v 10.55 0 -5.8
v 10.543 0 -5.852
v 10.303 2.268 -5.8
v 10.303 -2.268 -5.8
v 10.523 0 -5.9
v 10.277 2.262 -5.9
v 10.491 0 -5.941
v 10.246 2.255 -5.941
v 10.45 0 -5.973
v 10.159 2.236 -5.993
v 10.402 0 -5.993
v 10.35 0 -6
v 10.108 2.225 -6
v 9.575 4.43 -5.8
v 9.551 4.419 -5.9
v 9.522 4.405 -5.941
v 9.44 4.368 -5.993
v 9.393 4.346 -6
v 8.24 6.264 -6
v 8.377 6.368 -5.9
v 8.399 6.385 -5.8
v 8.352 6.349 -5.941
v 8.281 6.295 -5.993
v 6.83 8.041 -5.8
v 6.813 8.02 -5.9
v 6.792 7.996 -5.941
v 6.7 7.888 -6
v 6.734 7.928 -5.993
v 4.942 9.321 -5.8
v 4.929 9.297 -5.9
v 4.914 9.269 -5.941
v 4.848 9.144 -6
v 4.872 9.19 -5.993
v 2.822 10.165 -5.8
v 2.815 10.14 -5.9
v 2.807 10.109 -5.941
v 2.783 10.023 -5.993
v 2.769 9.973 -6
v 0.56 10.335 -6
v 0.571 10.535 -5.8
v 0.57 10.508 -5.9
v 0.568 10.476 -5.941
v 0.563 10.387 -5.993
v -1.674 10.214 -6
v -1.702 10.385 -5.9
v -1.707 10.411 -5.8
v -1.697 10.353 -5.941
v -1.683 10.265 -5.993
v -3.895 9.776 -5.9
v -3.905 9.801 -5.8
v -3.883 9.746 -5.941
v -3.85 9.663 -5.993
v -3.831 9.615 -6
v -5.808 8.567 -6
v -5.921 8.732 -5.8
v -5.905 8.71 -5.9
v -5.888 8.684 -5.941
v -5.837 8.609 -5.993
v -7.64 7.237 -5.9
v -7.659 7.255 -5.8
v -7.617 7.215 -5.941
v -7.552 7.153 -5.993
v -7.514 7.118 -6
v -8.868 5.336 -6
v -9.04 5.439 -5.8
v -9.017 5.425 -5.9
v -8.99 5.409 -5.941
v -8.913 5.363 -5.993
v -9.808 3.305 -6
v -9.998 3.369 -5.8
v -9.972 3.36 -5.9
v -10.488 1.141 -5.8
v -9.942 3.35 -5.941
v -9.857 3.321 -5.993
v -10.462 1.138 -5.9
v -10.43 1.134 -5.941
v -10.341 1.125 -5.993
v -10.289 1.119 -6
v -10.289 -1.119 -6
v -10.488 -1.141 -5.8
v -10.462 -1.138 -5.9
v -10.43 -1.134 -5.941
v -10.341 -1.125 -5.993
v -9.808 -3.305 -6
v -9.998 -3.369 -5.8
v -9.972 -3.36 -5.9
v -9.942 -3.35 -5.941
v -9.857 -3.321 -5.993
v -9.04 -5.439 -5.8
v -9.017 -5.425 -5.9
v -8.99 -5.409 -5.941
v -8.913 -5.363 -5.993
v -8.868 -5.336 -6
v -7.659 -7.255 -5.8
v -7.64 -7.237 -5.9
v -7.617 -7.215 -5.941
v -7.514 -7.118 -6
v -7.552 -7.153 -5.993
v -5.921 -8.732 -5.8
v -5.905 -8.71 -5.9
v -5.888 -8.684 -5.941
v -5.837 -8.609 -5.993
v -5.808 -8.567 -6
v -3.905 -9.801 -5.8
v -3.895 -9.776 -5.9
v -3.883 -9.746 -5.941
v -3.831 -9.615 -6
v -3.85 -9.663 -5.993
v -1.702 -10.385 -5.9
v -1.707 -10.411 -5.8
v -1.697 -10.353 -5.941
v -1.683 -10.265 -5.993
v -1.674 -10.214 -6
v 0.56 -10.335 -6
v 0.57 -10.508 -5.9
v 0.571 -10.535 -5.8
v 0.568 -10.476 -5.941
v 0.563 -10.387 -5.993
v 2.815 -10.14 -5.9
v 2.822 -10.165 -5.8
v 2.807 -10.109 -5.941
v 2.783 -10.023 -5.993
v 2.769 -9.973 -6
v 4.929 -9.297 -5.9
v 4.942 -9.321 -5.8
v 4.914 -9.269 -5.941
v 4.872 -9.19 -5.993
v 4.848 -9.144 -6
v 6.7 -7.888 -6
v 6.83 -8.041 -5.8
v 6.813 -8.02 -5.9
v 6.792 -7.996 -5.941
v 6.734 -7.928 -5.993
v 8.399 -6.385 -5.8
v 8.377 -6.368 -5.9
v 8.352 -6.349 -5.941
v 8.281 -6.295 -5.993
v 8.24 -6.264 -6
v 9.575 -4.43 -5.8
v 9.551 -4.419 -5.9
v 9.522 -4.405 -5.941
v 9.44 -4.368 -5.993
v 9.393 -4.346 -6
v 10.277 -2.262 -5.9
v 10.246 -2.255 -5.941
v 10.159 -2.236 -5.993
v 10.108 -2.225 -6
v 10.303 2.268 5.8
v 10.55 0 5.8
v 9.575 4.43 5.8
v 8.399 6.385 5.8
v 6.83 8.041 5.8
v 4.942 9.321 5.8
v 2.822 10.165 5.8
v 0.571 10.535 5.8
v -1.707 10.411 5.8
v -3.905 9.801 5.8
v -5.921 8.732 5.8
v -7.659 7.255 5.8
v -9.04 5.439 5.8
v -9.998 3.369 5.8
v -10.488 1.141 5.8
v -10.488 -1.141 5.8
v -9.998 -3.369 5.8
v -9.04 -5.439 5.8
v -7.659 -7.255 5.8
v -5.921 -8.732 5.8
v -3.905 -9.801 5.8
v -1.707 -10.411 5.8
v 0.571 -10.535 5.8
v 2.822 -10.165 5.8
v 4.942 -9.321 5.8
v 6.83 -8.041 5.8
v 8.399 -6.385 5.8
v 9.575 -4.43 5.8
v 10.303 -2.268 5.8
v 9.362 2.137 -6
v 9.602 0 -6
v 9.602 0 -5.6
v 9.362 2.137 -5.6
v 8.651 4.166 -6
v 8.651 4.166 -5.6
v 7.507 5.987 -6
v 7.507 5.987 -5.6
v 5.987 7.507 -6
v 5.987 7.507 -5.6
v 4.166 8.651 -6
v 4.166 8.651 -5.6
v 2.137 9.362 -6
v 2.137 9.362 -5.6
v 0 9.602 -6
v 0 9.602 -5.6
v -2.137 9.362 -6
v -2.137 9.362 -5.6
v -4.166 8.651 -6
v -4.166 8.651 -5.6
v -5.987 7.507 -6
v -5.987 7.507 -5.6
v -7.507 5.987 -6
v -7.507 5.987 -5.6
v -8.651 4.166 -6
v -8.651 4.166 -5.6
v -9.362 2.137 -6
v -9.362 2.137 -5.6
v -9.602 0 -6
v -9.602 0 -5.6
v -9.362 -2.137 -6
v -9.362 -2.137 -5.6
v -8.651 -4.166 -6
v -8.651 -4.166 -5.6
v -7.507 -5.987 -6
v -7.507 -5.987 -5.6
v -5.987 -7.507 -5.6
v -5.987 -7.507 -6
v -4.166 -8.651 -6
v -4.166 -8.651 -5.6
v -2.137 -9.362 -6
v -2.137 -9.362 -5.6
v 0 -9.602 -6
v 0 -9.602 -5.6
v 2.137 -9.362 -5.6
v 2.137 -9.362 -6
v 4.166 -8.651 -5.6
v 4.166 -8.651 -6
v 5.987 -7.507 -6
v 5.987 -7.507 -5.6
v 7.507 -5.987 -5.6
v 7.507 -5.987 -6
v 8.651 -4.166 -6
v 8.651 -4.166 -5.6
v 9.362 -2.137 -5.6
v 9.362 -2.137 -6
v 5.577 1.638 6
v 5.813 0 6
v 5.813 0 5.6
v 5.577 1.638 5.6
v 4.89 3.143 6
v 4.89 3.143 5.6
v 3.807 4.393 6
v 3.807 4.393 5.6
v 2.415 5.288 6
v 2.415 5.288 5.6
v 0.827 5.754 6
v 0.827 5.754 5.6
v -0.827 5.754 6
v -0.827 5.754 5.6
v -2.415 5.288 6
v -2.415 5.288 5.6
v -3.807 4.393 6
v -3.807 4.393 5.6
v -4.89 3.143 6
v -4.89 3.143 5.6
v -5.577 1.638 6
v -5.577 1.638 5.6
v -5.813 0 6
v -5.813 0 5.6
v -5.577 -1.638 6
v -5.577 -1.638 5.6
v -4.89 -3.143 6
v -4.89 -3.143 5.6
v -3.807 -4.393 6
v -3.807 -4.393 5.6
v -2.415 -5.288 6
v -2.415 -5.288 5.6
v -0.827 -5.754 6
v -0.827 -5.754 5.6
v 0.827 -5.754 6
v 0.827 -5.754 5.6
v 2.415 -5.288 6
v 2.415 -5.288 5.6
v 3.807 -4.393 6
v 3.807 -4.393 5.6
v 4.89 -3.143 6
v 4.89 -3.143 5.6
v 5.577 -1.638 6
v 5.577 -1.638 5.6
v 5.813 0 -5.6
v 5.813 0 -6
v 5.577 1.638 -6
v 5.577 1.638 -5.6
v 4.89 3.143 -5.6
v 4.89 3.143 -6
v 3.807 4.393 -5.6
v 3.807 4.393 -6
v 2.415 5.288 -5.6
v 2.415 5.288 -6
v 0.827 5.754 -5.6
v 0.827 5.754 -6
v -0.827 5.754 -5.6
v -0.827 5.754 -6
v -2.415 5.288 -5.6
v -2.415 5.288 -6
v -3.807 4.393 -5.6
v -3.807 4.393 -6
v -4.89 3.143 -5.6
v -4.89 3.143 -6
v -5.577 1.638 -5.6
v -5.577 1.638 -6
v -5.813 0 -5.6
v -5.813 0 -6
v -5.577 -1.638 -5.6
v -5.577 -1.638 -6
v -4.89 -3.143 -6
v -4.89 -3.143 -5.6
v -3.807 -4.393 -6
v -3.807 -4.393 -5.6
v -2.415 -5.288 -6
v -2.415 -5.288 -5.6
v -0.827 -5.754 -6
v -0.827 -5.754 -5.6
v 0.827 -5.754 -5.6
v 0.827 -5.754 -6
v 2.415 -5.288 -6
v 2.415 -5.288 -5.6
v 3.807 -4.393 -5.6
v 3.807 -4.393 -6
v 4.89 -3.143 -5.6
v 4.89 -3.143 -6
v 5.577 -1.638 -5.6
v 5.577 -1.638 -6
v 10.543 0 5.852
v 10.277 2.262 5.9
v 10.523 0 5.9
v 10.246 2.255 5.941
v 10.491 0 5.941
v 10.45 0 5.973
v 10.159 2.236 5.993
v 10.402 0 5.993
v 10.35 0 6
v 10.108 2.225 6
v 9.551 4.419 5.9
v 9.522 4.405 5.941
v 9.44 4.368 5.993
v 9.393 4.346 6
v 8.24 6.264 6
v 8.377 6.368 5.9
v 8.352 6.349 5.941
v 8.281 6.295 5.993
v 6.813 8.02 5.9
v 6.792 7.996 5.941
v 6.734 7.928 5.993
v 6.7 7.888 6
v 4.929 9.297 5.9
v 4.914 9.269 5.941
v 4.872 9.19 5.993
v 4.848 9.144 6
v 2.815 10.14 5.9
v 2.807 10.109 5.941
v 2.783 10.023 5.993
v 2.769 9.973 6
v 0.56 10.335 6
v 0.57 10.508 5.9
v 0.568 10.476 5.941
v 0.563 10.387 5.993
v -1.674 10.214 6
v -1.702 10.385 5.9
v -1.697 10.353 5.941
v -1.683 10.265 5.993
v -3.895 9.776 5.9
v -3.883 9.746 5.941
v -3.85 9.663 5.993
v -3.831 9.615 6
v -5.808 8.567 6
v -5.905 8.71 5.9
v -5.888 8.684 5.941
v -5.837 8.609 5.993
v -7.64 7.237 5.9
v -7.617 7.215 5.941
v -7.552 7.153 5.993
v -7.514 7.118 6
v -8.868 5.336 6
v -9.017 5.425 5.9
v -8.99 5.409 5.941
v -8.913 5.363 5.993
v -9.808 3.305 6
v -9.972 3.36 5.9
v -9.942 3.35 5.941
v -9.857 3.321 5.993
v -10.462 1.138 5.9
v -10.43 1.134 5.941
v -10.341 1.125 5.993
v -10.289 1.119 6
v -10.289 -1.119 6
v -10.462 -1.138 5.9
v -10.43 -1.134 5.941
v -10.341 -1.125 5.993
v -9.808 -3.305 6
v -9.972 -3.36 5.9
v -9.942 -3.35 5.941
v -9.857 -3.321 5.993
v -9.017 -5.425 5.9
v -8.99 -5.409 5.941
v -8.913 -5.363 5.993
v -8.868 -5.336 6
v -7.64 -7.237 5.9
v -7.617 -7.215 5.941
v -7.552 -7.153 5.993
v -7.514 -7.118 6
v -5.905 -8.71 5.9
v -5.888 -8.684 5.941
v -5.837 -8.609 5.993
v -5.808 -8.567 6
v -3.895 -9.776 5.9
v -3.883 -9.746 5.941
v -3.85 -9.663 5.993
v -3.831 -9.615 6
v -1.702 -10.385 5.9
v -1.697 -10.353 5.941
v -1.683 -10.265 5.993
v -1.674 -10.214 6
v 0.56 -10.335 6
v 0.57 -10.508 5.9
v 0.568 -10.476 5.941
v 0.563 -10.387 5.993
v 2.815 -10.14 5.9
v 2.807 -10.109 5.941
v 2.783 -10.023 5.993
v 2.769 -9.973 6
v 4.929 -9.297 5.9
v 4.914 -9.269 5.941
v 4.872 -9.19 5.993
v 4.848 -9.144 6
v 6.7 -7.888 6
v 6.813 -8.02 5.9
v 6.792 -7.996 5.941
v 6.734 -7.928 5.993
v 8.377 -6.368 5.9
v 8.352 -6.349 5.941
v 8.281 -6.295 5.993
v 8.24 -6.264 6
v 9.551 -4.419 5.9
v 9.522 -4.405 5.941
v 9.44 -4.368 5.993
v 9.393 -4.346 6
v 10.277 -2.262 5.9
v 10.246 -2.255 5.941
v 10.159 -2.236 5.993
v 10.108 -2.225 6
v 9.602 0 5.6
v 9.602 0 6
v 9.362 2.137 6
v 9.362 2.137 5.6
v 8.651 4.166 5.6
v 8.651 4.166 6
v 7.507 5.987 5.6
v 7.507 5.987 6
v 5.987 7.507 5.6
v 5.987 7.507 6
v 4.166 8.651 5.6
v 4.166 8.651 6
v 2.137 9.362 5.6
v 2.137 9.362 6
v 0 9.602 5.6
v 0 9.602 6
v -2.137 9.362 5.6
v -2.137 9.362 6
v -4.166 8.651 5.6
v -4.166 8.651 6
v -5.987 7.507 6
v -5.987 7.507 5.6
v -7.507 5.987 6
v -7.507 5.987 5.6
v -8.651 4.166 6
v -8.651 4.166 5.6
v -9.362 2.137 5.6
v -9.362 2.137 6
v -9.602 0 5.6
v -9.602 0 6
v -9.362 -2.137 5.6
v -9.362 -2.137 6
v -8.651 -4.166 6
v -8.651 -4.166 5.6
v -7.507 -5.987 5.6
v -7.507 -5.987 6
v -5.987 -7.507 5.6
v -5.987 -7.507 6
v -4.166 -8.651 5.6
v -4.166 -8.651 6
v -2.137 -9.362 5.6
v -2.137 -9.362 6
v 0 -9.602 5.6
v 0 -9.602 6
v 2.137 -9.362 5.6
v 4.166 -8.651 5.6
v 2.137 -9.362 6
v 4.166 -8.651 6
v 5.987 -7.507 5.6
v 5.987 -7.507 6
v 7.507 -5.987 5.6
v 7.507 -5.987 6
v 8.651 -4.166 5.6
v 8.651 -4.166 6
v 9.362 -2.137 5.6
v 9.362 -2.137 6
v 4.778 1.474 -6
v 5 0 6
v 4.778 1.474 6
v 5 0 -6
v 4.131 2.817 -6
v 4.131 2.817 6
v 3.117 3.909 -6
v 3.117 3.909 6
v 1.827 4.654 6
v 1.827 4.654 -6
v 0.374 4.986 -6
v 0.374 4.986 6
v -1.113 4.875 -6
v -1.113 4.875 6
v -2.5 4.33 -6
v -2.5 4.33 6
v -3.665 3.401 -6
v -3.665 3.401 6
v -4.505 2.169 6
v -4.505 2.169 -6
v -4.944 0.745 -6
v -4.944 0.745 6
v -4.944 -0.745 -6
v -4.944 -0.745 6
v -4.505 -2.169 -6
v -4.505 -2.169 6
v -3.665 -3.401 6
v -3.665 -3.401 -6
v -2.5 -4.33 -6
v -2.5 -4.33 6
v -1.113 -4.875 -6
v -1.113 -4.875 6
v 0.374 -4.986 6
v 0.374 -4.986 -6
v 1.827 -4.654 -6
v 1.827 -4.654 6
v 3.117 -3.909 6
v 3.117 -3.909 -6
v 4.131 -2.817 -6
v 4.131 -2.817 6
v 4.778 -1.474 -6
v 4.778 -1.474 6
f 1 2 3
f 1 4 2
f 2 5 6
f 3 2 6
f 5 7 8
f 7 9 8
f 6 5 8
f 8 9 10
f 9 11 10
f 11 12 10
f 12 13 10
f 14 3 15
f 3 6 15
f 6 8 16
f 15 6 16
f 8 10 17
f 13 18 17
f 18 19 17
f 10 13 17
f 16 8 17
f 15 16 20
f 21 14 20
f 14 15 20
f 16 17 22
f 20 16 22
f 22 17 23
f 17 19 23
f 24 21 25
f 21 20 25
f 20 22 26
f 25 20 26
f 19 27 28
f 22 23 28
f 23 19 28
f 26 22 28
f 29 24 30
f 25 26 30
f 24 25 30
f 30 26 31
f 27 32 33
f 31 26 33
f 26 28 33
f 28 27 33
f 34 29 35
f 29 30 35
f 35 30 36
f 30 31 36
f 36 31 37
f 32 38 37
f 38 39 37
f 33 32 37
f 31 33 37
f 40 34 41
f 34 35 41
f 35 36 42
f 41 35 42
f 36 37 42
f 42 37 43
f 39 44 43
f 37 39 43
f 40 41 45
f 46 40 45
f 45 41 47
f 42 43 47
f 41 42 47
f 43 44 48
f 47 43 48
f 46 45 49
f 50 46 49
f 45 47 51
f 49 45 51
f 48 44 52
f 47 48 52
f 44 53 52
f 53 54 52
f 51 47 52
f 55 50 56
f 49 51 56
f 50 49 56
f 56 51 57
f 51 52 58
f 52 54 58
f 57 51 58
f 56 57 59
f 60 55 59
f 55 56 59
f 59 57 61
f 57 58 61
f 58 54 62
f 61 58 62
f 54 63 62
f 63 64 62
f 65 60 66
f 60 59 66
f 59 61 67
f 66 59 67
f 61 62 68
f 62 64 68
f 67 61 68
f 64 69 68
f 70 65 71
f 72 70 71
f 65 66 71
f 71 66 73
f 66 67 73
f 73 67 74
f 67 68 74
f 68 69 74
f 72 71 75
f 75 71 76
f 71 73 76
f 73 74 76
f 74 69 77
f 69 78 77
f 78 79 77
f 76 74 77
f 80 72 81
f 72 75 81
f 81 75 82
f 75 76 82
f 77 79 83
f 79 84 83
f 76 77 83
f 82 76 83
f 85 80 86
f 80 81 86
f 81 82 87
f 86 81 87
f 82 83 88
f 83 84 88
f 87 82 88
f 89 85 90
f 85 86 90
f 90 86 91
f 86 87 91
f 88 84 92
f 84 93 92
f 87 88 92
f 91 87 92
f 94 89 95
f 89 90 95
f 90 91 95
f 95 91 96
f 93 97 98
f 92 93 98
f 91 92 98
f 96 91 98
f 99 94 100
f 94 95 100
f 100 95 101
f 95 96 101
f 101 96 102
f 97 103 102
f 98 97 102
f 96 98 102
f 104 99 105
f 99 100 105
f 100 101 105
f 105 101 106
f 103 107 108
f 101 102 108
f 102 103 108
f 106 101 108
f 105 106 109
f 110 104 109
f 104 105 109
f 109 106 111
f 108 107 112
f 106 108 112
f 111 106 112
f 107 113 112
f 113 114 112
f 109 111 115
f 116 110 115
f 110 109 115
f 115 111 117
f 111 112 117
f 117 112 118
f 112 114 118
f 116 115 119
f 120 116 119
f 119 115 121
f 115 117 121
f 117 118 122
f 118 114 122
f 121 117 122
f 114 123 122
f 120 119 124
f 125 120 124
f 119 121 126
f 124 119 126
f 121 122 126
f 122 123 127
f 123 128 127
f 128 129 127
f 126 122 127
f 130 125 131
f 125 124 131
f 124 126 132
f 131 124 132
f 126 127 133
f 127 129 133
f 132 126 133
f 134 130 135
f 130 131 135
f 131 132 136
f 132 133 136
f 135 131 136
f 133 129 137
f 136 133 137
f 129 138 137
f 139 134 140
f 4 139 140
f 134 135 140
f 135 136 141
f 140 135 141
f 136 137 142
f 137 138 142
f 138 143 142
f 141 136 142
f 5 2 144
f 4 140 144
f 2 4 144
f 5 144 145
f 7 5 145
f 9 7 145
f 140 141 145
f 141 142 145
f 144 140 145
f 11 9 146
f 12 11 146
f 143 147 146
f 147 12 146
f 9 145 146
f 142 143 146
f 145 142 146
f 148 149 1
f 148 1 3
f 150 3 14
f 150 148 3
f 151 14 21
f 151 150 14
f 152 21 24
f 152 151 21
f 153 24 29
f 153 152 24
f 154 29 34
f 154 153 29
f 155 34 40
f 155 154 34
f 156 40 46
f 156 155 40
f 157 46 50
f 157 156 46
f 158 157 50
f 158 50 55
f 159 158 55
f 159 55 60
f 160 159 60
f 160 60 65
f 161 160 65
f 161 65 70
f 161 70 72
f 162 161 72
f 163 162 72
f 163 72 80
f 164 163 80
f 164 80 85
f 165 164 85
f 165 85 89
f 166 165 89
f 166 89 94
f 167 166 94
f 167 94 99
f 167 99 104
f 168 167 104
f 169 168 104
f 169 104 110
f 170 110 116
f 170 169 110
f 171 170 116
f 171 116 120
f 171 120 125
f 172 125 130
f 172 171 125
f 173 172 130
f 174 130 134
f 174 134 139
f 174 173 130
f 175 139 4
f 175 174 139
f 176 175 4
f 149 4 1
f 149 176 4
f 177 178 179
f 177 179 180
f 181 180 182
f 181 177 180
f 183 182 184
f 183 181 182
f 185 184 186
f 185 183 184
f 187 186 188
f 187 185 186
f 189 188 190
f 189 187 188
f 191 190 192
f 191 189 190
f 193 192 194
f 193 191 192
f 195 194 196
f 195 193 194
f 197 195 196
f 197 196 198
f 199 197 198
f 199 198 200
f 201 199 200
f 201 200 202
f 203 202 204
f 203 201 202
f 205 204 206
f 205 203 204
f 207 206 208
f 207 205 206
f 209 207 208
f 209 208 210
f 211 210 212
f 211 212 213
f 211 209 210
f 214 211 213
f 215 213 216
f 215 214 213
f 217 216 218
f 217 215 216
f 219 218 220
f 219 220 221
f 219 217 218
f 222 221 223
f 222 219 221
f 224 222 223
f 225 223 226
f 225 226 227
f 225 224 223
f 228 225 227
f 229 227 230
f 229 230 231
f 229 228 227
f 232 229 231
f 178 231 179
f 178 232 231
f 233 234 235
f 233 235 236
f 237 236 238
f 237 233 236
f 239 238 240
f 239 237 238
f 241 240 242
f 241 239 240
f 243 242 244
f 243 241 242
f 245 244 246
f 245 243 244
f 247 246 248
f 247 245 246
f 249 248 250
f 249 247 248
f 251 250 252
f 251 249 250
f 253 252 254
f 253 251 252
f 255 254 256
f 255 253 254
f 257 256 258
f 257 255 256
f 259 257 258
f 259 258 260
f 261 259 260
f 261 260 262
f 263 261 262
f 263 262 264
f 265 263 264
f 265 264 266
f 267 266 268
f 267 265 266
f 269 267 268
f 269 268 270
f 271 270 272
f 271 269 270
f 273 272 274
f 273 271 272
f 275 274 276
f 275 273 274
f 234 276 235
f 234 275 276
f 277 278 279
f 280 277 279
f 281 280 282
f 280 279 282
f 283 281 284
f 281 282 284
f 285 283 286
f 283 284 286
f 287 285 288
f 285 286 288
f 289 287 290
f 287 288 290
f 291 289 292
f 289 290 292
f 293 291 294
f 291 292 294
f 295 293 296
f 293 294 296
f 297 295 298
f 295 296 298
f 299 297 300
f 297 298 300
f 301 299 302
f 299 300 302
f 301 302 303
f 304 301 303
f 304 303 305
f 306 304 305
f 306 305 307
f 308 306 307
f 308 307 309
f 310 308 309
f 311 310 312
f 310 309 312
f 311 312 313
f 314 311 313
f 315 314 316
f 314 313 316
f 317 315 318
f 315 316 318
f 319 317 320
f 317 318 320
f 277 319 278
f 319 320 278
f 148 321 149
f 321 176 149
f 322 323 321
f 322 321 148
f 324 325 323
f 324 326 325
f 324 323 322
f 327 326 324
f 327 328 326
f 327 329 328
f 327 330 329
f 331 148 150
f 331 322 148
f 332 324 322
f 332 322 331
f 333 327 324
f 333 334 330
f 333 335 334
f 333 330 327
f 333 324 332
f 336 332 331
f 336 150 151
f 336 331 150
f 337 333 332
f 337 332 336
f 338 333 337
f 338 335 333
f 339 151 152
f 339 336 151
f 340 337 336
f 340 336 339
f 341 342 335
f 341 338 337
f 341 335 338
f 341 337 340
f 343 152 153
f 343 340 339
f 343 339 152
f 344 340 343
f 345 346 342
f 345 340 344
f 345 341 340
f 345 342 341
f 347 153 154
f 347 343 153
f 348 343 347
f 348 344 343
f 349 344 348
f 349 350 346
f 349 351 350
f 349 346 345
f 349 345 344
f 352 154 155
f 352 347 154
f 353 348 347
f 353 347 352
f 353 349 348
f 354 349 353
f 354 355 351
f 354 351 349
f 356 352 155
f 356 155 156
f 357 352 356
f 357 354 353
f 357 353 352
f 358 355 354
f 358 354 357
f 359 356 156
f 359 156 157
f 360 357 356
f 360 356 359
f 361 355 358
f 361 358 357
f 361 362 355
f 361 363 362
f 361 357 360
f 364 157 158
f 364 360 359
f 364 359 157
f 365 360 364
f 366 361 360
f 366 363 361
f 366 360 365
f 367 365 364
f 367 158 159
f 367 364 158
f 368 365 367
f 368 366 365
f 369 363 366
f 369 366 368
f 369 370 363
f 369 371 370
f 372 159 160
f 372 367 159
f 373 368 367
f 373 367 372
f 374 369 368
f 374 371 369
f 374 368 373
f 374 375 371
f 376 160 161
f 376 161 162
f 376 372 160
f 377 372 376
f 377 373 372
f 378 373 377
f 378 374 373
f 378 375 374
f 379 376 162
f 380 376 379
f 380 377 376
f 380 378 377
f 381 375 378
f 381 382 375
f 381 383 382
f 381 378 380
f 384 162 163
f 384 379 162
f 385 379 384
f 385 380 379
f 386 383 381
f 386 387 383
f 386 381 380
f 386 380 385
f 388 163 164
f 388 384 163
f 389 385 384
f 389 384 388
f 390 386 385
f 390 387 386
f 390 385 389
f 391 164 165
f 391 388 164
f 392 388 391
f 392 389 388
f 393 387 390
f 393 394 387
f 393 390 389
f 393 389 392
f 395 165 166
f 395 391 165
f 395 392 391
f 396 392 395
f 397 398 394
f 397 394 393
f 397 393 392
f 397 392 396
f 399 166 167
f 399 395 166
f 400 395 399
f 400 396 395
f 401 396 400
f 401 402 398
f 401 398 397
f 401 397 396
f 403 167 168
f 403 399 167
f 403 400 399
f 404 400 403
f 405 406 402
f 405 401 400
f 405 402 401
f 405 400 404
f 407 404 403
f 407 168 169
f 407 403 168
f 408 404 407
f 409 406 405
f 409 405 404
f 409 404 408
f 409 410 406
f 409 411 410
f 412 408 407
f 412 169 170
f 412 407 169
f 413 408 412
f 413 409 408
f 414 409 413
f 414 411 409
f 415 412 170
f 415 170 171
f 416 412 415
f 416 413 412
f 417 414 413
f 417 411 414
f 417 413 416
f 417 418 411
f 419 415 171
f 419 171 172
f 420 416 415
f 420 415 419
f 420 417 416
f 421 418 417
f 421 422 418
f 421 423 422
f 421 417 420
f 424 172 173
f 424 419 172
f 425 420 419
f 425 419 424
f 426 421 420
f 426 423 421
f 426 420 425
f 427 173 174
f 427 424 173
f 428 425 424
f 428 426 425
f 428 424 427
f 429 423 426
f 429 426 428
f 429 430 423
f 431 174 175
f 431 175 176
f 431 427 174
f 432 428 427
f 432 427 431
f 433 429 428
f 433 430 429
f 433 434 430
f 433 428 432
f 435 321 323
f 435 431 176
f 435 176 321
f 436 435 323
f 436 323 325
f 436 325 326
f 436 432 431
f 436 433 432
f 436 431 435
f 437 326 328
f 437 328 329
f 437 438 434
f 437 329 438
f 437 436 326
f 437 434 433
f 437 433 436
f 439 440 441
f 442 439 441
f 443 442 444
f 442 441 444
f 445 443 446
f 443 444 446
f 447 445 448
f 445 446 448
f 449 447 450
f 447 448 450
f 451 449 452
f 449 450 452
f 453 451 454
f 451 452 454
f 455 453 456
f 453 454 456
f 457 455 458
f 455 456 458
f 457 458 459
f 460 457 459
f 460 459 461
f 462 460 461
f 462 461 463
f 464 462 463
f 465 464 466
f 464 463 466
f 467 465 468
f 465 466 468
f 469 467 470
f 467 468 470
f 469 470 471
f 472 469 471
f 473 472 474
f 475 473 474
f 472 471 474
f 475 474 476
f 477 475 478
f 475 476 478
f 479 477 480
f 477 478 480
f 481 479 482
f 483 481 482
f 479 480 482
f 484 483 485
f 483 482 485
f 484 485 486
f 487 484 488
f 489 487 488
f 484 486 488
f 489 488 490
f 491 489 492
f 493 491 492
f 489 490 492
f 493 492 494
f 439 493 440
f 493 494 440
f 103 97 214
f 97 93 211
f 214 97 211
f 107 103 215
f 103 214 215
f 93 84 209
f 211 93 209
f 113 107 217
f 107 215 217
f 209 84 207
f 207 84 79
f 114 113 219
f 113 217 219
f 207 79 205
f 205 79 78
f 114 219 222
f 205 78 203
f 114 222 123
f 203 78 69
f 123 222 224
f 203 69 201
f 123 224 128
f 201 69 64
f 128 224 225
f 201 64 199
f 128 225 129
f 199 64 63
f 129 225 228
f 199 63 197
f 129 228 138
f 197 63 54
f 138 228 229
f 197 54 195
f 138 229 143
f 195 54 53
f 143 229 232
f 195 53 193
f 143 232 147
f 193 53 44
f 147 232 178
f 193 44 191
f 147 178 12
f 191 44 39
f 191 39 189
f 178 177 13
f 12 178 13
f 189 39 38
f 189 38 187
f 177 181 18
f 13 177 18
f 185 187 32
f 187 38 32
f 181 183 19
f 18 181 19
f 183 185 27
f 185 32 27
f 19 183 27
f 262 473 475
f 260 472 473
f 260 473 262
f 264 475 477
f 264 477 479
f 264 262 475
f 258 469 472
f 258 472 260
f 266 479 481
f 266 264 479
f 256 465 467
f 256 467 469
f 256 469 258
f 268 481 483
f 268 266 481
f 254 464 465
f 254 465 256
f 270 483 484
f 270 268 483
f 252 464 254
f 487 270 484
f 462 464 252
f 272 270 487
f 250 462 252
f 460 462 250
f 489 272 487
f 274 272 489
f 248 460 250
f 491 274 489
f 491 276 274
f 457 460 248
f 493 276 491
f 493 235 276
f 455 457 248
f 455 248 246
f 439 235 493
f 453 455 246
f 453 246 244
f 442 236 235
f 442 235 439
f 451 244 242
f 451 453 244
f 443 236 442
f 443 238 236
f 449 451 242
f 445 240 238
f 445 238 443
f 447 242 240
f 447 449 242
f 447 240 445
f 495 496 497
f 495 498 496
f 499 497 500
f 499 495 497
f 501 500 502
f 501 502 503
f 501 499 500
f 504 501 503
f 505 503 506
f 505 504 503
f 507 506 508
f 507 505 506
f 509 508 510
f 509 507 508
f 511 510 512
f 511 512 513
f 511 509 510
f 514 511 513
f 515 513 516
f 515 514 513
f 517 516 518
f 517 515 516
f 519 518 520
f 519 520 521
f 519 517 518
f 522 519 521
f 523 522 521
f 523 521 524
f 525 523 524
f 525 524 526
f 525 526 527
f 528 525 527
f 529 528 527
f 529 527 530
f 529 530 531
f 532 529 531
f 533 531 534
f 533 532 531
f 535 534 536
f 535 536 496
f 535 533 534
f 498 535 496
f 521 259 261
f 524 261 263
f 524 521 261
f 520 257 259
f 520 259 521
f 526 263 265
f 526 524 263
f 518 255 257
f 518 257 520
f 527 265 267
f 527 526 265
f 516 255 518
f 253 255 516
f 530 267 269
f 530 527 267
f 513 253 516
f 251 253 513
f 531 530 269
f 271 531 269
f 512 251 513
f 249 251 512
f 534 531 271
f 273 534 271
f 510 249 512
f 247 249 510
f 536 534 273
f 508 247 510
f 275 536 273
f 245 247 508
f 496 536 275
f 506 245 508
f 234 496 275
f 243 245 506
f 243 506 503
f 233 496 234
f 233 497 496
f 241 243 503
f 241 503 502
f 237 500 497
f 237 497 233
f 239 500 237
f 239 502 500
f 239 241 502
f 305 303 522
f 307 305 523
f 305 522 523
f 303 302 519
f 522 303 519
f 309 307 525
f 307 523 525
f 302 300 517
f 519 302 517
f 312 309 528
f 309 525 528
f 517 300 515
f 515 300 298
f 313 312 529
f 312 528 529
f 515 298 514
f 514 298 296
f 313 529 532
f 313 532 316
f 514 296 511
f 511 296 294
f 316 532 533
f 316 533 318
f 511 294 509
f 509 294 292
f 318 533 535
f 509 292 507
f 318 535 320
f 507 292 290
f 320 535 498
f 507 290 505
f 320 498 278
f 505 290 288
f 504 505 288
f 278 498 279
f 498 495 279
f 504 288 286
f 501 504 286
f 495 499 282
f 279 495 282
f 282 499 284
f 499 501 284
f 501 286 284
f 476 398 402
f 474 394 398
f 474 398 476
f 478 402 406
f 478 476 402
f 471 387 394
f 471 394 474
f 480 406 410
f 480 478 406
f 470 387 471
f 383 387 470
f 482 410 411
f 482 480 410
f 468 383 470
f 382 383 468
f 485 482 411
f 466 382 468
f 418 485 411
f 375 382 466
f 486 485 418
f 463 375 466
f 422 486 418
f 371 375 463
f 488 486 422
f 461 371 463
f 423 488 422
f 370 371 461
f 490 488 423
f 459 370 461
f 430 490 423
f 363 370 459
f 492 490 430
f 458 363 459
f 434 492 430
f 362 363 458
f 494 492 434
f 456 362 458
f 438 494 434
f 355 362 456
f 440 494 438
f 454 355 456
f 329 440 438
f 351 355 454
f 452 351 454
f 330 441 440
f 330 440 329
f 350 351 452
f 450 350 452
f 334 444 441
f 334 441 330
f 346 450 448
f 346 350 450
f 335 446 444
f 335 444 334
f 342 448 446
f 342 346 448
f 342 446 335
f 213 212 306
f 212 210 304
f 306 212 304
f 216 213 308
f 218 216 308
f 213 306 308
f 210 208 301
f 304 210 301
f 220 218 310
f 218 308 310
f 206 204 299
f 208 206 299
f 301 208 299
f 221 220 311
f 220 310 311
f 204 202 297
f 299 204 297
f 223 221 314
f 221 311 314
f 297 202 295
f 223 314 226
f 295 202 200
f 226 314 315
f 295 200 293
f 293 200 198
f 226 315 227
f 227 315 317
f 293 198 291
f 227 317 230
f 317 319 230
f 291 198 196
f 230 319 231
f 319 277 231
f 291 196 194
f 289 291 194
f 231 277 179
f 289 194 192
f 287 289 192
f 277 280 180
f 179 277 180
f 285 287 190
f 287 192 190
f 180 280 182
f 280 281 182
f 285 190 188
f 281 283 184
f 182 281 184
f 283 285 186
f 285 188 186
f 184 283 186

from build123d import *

# Parameters (mm, degrees)
SKETCH1_R           = 10.55
SKETCH1_R_2         = 5
BOSS_EXTRUDE1_DEPTH = 6
FILLET1_R           = 0.2
SKETCH3_R           = 9.602296017
SKETCH3_R_2         = 5.812916565
CUT_EXTRUDE1_DEPTH  = 0.4


with BuildPart() as part:
    # Sketch1 → Boss-Extrude1 (new, symmetric)
    with BuildSketch(Plane.XY):
        Circle(SKETCH1_R)
        Circle(SKETCH1_R_2, mode=Mode.SUBTRACT)
    extrude(amount=BOSS_EXTRUDE1_DEPTH, both=True)

    # Fillet1
    fillet1_edges = [part.edges().sort_by_distance(p)[0] for p in [
        (-10.55, 0, -6),
        (-10.55, 0, 6),
    ]]
    fillet(fillet1_edges, radius=FILLET1_R)

    # Sketch3 → Cut-Extrude1 (cut)
    with BuildSketch(Plane.XY.offset(6)):
        Circle(SKETCH3_R)
        Circle(SKETCH3_R_2, mode=Mode.SUBTRACT)
    cut_extrude1 = extrude(amount=-CUT_EXTRUDE1_DEPTH, mode=Mode.SUBTRACT)

    # Mirror1: Cut-Extrude1 across plane
    add(cut_extrude1.mirror(Plane.XY), mode=Mode.SUBTRACT)


solid = part.part
